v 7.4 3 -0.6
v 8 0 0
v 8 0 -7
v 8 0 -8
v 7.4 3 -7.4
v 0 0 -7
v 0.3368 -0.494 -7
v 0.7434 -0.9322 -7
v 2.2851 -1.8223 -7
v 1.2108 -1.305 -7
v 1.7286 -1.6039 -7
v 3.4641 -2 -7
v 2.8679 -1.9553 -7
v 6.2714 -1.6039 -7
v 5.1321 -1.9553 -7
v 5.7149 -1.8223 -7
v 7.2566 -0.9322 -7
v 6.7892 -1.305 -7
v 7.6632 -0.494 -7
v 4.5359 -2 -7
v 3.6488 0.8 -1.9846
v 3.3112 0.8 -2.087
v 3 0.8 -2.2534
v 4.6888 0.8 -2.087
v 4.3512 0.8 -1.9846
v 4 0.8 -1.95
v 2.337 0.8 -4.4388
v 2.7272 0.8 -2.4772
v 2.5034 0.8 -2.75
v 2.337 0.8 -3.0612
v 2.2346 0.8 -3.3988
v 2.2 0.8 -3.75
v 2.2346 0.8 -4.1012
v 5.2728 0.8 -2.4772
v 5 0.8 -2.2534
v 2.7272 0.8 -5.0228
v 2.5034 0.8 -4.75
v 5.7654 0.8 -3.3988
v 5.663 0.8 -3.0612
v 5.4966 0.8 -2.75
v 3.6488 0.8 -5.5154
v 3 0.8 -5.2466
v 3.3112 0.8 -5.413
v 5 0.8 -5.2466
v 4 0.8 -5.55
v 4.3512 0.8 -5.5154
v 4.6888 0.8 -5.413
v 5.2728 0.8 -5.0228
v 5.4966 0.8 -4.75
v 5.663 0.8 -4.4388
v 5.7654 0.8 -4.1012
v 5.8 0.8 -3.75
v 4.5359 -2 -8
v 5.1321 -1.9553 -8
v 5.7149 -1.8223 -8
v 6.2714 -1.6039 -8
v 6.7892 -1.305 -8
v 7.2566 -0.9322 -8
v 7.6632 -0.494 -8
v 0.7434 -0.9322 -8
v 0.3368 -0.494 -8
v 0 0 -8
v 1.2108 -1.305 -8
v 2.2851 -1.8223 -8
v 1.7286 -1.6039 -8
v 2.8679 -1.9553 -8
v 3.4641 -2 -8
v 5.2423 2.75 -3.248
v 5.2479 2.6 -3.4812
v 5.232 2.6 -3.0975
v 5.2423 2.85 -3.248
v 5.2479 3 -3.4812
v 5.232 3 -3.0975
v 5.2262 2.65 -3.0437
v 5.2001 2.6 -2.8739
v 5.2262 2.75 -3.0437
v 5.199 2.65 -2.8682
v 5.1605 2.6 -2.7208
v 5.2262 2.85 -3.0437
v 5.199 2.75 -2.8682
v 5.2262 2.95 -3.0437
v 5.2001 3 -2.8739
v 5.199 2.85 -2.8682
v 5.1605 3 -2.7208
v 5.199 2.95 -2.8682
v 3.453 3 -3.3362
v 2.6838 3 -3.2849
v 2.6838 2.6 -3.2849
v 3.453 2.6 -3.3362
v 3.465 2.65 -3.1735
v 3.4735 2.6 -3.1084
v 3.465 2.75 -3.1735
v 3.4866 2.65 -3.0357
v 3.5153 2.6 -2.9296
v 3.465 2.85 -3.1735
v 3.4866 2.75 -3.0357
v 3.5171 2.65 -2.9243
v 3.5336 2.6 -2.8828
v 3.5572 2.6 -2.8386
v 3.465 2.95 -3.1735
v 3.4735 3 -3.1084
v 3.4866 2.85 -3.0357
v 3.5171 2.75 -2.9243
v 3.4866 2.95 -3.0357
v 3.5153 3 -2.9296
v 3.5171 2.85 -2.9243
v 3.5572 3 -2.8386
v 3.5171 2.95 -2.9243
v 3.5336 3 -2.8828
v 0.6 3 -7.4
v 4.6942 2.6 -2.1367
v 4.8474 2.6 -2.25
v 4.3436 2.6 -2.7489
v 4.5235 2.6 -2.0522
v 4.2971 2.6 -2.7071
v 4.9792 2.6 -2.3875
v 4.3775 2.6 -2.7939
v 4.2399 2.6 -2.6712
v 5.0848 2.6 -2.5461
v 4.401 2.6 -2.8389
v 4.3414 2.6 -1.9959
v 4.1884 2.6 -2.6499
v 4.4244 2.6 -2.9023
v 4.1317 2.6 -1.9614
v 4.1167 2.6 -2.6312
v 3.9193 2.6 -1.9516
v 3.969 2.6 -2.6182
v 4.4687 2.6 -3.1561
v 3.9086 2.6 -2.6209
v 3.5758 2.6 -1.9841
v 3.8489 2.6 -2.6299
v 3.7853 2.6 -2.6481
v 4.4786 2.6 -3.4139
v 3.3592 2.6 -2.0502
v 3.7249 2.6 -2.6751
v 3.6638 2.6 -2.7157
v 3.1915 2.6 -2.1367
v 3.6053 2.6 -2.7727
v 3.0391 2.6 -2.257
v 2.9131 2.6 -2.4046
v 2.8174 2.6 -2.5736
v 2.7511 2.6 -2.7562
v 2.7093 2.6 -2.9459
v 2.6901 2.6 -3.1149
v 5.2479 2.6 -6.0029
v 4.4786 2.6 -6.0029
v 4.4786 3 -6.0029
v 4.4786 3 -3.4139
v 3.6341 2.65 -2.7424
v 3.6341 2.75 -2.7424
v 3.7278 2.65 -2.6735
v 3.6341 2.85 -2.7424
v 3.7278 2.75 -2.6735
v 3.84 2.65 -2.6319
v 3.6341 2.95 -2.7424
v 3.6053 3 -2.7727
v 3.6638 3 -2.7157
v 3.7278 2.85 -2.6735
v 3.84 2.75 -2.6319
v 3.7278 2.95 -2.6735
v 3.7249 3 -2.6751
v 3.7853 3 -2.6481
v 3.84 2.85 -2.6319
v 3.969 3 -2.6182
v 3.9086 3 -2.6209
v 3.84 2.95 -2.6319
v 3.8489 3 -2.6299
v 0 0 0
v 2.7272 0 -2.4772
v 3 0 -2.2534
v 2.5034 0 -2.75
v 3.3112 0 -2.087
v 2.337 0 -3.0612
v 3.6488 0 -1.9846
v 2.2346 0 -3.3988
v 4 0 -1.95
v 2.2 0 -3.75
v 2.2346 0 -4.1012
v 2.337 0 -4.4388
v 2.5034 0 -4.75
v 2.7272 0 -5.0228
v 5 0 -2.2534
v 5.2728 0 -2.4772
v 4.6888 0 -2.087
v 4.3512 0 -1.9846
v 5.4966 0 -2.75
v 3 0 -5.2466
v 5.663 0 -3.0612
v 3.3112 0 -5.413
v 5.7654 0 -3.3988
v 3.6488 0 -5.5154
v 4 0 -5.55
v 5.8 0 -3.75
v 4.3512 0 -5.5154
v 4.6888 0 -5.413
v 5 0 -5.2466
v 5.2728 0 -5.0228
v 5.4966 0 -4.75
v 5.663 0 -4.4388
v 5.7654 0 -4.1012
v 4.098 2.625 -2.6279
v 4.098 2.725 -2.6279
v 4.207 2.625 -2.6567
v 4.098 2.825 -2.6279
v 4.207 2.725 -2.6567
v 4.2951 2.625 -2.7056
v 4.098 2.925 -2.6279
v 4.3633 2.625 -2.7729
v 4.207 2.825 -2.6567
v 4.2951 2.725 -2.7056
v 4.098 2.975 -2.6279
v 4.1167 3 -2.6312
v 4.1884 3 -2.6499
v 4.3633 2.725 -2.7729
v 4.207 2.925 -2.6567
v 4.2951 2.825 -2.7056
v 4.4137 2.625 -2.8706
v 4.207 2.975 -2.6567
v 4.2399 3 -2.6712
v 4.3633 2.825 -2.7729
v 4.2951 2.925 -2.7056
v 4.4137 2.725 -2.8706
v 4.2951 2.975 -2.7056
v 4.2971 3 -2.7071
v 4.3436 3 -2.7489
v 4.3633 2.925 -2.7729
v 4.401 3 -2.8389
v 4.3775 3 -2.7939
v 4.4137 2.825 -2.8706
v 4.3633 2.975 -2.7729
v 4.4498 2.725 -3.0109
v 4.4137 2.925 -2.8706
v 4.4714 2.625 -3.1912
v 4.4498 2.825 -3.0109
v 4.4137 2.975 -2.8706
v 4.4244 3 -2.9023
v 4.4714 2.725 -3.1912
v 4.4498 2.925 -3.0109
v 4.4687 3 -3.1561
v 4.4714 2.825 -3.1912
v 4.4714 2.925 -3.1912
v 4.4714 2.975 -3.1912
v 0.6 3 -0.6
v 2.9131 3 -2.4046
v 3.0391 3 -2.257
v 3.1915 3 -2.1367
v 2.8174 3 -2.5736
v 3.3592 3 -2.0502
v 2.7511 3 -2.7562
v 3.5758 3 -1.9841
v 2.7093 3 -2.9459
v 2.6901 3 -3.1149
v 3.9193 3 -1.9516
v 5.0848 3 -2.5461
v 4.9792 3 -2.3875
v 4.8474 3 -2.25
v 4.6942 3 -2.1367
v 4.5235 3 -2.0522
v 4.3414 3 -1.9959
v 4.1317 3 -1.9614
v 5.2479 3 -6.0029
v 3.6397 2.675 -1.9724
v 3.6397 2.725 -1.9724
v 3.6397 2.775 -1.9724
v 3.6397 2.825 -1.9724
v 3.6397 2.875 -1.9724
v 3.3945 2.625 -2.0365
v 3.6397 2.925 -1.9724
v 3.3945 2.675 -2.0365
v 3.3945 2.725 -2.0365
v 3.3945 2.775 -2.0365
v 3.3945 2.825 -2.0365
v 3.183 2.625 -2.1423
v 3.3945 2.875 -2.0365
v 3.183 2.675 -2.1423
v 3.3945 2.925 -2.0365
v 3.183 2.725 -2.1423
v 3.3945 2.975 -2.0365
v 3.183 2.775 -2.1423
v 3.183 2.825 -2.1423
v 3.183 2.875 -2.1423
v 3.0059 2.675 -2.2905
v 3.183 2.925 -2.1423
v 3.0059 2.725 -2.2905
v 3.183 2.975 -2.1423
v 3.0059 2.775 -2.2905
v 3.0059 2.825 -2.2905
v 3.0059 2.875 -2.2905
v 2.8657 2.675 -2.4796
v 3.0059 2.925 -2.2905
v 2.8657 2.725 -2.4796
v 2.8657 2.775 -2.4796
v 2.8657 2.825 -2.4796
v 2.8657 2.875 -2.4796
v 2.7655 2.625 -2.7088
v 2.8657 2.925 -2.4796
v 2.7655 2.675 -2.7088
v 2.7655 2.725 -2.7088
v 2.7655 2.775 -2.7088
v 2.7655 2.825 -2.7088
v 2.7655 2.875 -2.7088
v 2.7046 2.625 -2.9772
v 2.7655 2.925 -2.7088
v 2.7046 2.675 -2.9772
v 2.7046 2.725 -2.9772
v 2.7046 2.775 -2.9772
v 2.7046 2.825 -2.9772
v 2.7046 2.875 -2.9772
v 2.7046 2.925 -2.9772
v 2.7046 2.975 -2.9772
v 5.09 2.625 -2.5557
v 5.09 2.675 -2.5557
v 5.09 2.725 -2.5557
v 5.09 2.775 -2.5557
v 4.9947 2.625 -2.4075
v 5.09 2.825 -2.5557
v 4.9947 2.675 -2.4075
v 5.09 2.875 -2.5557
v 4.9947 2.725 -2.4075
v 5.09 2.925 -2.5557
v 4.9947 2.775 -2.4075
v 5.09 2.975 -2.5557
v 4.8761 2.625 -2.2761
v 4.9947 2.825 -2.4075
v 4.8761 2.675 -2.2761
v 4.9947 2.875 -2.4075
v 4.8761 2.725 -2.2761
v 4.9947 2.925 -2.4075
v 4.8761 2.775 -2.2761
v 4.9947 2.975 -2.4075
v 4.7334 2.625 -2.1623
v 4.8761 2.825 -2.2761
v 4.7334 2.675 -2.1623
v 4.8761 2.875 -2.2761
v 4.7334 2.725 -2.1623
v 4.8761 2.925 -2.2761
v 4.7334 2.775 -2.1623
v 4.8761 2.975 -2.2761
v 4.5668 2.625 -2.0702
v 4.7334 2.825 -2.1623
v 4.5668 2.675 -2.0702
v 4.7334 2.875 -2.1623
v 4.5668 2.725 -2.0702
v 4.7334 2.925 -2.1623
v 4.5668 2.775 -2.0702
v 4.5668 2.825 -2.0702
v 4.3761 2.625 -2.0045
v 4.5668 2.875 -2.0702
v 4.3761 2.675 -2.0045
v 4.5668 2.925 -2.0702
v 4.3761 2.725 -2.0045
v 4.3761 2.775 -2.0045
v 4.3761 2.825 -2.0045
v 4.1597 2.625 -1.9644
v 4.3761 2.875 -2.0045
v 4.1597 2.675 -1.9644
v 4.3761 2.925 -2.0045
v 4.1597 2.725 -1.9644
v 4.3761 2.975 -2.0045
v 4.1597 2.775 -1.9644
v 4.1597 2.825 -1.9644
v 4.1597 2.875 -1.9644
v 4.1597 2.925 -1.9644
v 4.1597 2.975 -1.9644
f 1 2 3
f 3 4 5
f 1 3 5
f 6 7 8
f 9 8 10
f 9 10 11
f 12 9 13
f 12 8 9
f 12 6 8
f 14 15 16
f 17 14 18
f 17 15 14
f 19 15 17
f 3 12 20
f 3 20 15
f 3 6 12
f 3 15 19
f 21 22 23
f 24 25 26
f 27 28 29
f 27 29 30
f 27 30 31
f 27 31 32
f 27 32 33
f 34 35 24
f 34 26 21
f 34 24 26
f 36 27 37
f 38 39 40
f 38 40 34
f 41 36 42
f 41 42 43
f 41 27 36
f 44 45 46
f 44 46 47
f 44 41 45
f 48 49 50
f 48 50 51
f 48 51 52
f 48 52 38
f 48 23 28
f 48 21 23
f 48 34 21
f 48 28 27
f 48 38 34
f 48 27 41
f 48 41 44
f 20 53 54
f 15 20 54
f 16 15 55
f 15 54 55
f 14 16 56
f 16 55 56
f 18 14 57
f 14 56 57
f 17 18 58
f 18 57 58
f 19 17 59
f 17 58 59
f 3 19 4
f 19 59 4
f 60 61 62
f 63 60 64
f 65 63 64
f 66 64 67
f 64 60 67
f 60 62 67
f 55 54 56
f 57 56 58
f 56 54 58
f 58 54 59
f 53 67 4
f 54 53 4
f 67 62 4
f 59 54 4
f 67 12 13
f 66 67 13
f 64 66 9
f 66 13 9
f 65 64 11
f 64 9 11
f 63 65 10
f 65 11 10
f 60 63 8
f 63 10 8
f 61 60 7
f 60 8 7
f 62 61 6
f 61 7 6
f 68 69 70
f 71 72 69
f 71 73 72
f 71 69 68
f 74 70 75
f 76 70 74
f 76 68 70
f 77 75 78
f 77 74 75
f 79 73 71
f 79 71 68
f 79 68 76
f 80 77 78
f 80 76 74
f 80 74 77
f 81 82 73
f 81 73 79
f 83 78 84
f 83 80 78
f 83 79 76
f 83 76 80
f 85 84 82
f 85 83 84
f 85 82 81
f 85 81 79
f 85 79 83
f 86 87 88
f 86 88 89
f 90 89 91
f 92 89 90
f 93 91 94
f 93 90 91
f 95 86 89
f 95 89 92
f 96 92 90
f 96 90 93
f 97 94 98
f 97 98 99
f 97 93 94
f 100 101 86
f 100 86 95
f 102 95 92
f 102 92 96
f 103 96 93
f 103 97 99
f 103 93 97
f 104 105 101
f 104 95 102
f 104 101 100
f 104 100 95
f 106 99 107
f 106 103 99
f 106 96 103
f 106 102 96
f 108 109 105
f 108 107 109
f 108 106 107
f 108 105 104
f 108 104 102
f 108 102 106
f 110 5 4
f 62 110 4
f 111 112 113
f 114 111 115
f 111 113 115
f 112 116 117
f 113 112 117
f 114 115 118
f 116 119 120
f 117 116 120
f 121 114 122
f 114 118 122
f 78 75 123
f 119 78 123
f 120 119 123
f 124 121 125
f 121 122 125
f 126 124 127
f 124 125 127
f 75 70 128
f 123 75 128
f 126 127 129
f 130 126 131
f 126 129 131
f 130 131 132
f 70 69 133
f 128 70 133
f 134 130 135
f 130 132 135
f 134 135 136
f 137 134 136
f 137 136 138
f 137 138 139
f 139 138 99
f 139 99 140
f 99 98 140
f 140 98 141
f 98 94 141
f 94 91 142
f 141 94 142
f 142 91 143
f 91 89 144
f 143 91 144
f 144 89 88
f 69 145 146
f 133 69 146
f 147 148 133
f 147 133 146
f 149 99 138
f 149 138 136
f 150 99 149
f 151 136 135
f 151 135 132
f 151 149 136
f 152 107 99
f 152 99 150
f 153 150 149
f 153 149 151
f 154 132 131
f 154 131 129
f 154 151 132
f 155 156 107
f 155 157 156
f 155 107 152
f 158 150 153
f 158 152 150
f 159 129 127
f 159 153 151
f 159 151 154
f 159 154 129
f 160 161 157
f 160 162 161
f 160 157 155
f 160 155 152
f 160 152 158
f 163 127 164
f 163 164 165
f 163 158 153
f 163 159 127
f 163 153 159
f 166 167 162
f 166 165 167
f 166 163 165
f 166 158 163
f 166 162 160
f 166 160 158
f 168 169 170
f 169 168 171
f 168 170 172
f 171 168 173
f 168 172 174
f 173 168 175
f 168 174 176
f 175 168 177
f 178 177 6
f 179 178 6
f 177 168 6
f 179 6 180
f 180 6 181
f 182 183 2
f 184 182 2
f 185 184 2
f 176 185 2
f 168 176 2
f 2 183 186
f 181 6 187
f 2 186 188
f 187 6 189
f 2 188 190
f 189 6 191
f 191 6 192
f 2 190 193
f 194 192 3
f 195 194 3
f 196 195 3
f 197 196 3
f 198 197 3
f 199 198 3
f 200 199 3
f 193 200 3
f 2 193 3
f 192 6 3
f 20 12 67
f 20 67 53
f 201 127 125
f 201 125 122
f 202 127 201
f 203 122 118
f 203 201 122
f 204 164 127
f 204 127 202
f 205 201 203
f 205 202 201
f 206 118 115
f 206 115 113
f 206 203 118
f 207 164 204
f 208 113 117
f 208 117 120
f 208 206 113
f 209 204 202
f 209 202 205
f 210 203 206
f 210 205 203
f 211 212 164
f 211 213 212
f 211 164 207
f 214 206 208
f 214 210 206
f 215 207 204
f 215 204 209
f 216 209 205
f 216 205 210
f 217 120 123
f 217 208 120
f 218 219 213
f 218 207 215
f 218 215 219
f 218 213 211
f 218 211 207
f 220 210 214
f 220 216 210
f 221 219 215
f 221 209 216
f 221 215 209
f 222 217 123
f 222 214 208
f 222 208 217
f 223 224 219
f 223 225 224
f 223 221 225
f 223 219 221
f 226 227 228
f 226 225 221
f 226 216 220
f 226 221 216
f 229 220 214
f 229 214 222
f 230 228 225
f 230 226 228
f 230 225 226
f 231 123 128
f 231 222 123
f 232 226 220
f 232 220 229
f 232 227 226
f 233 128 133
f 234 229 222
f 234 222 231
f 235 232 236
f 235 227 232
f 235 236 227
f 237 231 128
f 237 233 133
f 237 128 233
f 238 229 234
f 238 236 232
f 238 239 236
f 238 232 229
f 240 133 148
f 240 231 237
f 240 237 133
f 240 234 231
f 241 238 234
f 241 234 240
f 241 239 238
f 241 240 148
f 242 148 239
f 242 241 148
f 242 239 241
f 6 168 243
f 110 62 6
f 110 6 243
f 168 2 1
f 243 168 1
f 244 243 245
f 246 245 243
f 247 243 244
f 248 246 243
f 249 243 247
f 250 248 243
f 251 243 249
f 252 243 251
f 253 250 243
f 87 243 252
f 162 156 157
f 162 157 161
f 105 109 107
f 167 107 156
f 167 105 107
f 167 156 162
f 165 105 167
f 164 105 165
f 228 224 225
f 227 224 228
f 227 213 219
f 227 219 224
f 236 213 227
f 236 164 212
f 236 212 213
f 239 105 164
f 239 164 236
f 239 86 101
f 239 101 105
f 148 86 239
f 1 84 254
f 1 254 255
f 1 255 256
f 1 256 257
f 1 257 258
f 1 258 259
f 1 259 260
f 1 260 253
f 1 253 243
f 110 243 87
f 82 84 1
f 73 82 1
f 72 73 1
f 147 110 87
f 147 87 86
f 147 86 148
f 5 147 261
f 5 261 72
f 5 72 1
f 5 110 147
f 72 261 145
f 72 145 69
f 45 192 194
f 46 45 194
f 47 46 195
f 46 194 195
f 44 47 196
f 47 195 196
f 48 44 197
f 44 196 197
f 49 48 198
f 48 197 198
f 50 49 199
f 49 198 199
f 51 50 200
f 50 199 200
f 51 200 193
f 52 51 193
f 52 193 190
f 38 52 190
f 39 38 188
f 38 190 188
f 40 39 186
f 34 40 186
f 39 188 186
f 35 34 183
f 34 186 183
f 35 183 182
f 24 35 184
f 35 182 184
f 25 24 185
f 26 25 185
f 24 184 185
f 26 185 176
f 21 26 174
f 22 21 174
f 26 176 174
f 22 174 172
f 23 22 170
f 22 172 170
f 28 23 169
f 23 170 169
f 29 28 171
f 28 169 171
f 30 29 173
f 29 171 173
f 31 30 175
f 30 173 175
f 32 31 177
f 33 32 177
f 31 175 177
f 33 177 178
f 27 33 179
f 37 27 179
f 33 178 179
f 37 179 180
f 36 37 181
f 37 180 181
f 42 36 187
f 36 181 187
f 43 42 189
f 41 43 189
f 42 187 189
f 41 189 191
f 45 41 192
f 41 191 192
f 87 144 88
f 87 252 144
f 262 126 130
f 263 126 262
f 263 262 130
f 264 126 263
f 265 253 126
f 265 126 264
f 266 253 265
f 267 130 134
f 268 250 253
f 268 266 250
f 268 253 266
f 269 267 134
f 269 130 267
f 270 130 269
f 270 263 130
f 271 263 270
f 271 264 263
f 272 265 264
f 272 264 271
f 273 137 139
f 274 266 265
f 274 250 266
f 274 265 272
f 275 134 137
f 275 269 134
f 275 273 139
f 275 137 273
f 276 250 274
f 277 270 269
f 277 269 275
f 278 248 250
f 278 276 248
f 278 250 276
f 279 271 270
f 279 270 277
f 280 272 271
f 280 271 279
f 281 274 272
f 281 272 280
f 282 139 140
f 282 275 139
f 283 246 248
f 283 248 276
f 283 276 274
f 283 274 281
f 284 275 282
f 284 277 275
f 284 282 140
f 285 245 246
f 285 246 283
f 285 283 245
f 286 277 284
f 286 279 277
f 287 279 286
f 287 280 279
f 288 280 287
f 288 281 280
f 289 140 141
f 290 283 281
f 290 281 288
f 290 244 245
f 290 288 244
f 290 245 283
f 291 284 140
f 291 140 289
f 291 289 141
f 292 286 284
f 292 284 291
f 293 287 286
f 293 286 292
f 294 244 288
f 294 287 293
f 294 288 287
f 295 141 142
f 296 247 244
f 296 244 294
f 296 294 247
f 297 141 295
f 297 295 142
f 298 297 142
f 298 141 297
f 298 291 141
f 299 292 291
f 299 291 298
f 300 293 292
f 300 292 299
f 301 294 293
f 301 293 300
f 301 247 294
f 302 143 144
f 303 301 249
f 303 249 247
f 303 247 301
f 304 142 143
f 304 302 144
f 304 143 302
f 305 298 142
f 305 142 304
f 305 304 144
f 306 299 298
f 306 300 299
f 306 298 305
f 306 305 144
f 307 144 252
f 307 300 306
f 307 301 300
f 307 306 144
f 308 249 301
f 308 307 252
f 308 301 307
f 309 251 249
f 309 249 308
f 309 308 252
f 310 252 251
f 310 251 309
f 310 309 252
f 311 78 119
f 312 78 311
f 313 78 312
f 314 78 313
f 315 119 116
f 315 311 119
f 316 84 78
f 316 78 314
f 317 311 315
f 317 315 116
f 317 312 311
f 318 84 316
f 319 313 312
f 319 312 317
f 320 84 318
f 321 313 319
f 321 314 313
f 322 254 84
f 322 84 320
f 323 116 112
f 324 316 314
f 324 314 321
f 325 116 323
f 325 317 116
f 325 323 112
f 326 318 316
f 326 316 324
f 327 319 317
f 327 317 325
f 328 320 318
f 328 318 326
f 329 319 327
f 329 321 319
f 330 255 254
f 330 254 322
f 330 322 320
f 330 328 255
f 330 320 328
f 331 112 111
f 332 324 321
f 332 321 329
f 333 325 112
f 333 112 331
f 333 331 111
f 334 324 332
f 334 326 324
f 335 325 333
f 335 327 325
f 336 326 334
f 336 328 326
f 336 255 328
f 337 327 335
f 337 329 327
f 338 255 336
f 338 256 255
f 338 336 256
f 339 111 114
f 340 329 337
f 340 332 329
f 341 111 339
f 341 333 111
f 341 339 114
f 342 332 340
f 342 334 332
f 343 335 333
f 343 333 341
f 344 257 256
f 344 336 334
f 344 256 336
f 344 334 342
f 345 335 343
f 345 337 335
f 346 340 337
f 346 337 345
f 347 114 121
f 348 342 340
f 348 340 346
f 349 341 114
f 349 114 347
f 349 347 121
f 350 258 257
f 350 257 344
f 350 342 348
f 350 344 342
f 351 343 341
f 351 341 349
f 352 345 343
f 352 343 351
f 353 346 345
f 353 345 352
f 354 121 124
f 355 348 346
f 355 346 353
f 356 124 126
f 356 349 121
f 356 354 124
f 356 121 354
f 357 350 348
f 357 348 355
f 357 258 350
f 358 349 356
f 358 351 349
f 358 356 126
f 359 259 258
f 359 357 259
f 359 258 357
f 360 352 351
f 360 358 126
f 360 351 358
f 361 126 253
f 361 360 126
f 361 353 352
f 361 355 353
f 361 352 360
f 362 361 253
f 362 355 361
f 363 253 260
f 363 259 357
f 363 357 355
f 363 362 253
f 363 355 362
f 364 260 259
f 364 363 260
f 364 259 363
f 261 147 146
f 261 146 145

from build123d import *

# Parameters (mm, degrees)
SKETCH1_W               = 8
SKETCH1_H               = 8
BOSS_EXTRUDE1_DEPTH     = 3
CUT_EXTRUDE1_DEPTH      = 12.704699911
CUT_EXTRUDE1_DEPTH_BACK = 12.704699911
CUT_EXTRUDE2_DEPTH      = 11
SKETCH4_R               = 1.8
CUT_EXTRUDE3_DEPTH      = 0.8
SKETCH5_W               = 8
SKETCH5_H               = 1
BOSS_EXTRUDE2_DEPTH     = 2
FILLET1_R               = 4
CUT_EXTRUDE4_DEPTH      = 0.4


with BuildPart() as part:
    # Sketch1 → Boss-Extrude1 (new body)
    with BuildSketch(Plane(origin=(0, 0, 0), x_dir=(1, 0, 0), z_dir=(0, 1, 0))):
        with Locations((4, 4)):
            Rectangle(SKETCH1_W, SKETCH1_H)
    extrude(amount=BOSS_EXTRUDE1_DEPTH)

    # Sketch2 → Cut-Extrude1 (cut, two sides: drawn at the far end of the back side and taken through both)
    with BuildSketch(Plane.XY.offset(-CUT_EXTRUDE1_DEPTH_BACK)):
        Polygon((0, 0), (0.6, 3), (0, 3), align=None)
        Polygon((8, 0), (7.4, 3), (8, 3), align=None)
    extrude(amount=CUT_EXTRUDE1_DEPTH + CUT_EXTRUDE1_DEPTH_BACK, mode=Mode.SUBTRACT)

    # Sketch3 → Cut-Extrude2 (cut)
    with BuildSketch(Plane(origin=(0, 0, 0), x_dir=(0, 0, -1), z_dir=(1, 0, 0))):
        Polygon((0, 0), (0.6, 3), (0, 3), align=None)
        Polygon((8, 3), (7.4, 3), (8, 0), align=None)
    extrude(amount=CUT_EXTRUDE2_DEPTH, mode=Mode.SUBTRACT)

    # Sketch4 → Cut-Extrude3 (cut)
    with BuildSketch(Plane.XZ):
        with Locations(Location((4, -3.75, 0), (0, 0, 270))):
            Circle(SKETCH4_R)
    extrude(amount=-CUT_EXTRUDE3_DEPTH, mode=Mode.SUBTRACT)

    # Sketch5 → Boss-Extrude2 (add)
    with BuildSketch(Plane.XZ):
        with Locations((4, -7.5)):
            Rectangle(SKETCH5_W, SKETCH5_H)
    extrude(amount=BOSS_EXTRUDE2_DEPTH)

    # Fillet1
    # the kernel refuses this fillet: 4 mm, written as the material it takes off along each edge
    with BuildSketch(Plane(origin=(8, -2, -16.660254038), x_dir=(0, 1, 0), z_dir=(0, 0, 1)), Plane(origin=(0, -2, 1.660254038), x_dir=(0, 1, 0), z_dir=(0, 0, -1))) as fillet1_piece_1:
        with BuildLine():
            CenterArc((4, 3.464101615), FILLET1_R, 180, 60)
            Line((0, 3.464101615), (-0.08, 3.464101615))
            Line((-0.08, 3.464101615), (-0.08, 0))
            Line((-0.08, 0), (0, -0.08))
            ThreePointArc((0, -0.08), (1, -0.08), (1.96, -0.069282032))
            Line((1.96, -0.069282032), (2, 0))
        make_face()
    extrude(amount=18.320508076, mode=Mode.SUBTRACT)

    # Sketch6 → Cut-Extrude4 (cut)
    with BuildSketch(Plane(origin=(0, 3, 0), x_dir=(1, 0, 0), z_dir=(0, 1, 0))):
        with BuildLine():
            Line((4.478635236, 6.002856352), (5.247866005, 6.002856352))
            Line((5.247866005, 6.002856352), (5.247866005, 3.481221736))
            add(Edge.make_bspline(
                [(5.247866005, 3.481221736), (5.247522255, 3.441153869), (5.246855206, 3.363401883), (5.242756502, 3.250390465), (5.236658321, 3.14454193), (5.227277222, 3.045871471), (5.21405872, 2.954592388), (5.200049867, 2.869976575), (5.183041427, 2.792451692), (5.167800036, 2.743951306), (5.160526262, 2.72080507)],
                knots=[0, 0, 0, 0, 1.251619961, 2.428777588, 3.532126049, 4.56323557, 5.523704531, 6.412540087, 7.242403515, 8, 8, 8, 8], degree=3))
            add(Edge.make_bspline(
                [(5.160526262, 2.72080507), (5.150361081, 2.692282601), (5.130243602, 2.635834988), (5.091141653, 2.555314881), (5.046176431, 2.479084315), (4.995474484, 2.406812938), (4.939514717, 2.338210987), (4.876399077, 2.275086649), (4.8083478, 2.215238098), (4.733446681, 2.161145289), (4.653580791, 2.110709794), (4.566475051, 2.068688963), (4.473843299, 2.032340387), (4.374908104, 2.002816628), (4.269640778, 1.979716073), (4.158311001, 1.962901894), (4.040770466, 1.95334773), (3.960490164, 1.952175274), (3.919340364, 1.9515743)],
                knots=[0, 0, 0, 0, 0.925533072, 1.831683394, 2.73255258, 3.630007683, 4.529542467, 5.436465751, 6.357118906, 7.298274949, 8.259461937, 9.242242071, 10.251058183, 11.300341426, 12.396409345, 13.544807631, 14.74152597, 16, 16, 16, 16], degree=3))
            add(Edge.make_bspline(
                [(3.919340364, 1.9515743), (3.871225528, 1.952737211), (3.777685944, 1.954998015), (3.641661475, 1.97000769), (3.514100564, 1.996260242), (3.395387048, 2.034179675), (3.284307874, 2.08131717), (3.182206561, 2.140114726), (3.088540477, 2.209392701), (3.003918711, 2.289363431), (2.928299433, 2.379218215), (2.863026475, 2.479745415), (2.80762712, 2.589893743), (2.762984692, 2.710161506), (2.727739397, 2.839972913), (2.702317462, 2.979601288), (2.687147894, 3.129126134), (2.684913172, 3.2319872), (2.683763441, 3.284907634)],
                knots=[0, 0, 0, 0, 1.114068574, 2.165849827, 3.164101702, 4.124467949, 5.046988974, 5.952942428, 6.846011651, 7.738523925, 8.642829306, 9.558838605, 10.50752403, 11.491963144, 12.524197802, 13.618364352, 14.774685164, 16, 16, 16, 16], degree=3))
            Line((2.683763441, 3.284907634), (3.45299421, 3.336189685))
            add(Edge.make_bspline(
                [(3.45299421, 3.336189685), (3.454375767, 3.307862598), (3.45702498, 3.25354382), (3.464380935, 3.175240866), (3.473682687, 3.103271277), (3.485853837, 3.037851064), (3.498960823, 2.978427444), (3.515987002, 2.926169857), (3.533886556, 2.879240769), (3.549608387, 2.851783511), (3.557160877, 2.838593531)],
                knots=[0, 0, 0, 0, 1.326609226, 2.543847584, 3.678365909, 4.719972403, 5.656527627, 6.521948534, 7.28997025, 8, 8, 8, 8], degree=3))
            add(Edge.make_bspline(
                [(3.557160877, 2.838593531), (3.56872297, 2.821148121), (3.59147861, 2.786813382), (3.632990929, 2.742071605), (3.677558537, 2.702955843), (3.727619554, 2.672203009), (3.781780527, 2.648016829), (3.840448037, 2.63044225), (3.903460331, 2.619785853), (3.946808463, 2.61876437), (3.969019851, 2.618240967)],
                knots=[0, 0, 0, 0, 1.023658308, 2.014687051, 2.979722519, 3.920049697, 4.880550909, 5.878122304, 6.912759386, 8, 8, 8, 8], degree=3))
            add(Edge.make_bspline(
                [(3.969019851, 2.618240967), (3.991477248, 2.618659453), (4.034647527, 2.619463917), (4.09686091, 2.626779219), (4.154063033, 2.638632824), (4.206285054, 2.655294856), (4.253703868, 2.676924623), (4.295268393, 2.704596166), (4.33276969, 2.735732915), (4.36516489, 2.773188264), (4.392766236, 2.818318957), (4.415812105, 2.873248962), (4.43563784, 2.938204221), (4.450960178, 3.01367855), (4.464002509, 3.098949399), (4.472183692, 3.194770716), (4.478064386, 3.300859295), (4.478439634, 3.37517575), (4.478635236, 3.413914044)],
                knots=[0, 0, 0, 0, 0.980314827, 1.884477813, 2.730827652, 3.527503874, 4.27366112, 4.998269146, 5.70163477, 6.396145331, 7.150281155, 8.001758491, 8.990432449, 10.111292654, 11.361572691, 12.75538406, 14.308707205, 16, 16, 16, 16], degree=3))
            Line((4.478635236, 3.413914044), (4.478635236, 6.002856352))
        make_face()
    extrude(amount=-CUT_EXTRUDE4_DEPTH, mode=Mode.SUBTRACT)


solid = part.part
